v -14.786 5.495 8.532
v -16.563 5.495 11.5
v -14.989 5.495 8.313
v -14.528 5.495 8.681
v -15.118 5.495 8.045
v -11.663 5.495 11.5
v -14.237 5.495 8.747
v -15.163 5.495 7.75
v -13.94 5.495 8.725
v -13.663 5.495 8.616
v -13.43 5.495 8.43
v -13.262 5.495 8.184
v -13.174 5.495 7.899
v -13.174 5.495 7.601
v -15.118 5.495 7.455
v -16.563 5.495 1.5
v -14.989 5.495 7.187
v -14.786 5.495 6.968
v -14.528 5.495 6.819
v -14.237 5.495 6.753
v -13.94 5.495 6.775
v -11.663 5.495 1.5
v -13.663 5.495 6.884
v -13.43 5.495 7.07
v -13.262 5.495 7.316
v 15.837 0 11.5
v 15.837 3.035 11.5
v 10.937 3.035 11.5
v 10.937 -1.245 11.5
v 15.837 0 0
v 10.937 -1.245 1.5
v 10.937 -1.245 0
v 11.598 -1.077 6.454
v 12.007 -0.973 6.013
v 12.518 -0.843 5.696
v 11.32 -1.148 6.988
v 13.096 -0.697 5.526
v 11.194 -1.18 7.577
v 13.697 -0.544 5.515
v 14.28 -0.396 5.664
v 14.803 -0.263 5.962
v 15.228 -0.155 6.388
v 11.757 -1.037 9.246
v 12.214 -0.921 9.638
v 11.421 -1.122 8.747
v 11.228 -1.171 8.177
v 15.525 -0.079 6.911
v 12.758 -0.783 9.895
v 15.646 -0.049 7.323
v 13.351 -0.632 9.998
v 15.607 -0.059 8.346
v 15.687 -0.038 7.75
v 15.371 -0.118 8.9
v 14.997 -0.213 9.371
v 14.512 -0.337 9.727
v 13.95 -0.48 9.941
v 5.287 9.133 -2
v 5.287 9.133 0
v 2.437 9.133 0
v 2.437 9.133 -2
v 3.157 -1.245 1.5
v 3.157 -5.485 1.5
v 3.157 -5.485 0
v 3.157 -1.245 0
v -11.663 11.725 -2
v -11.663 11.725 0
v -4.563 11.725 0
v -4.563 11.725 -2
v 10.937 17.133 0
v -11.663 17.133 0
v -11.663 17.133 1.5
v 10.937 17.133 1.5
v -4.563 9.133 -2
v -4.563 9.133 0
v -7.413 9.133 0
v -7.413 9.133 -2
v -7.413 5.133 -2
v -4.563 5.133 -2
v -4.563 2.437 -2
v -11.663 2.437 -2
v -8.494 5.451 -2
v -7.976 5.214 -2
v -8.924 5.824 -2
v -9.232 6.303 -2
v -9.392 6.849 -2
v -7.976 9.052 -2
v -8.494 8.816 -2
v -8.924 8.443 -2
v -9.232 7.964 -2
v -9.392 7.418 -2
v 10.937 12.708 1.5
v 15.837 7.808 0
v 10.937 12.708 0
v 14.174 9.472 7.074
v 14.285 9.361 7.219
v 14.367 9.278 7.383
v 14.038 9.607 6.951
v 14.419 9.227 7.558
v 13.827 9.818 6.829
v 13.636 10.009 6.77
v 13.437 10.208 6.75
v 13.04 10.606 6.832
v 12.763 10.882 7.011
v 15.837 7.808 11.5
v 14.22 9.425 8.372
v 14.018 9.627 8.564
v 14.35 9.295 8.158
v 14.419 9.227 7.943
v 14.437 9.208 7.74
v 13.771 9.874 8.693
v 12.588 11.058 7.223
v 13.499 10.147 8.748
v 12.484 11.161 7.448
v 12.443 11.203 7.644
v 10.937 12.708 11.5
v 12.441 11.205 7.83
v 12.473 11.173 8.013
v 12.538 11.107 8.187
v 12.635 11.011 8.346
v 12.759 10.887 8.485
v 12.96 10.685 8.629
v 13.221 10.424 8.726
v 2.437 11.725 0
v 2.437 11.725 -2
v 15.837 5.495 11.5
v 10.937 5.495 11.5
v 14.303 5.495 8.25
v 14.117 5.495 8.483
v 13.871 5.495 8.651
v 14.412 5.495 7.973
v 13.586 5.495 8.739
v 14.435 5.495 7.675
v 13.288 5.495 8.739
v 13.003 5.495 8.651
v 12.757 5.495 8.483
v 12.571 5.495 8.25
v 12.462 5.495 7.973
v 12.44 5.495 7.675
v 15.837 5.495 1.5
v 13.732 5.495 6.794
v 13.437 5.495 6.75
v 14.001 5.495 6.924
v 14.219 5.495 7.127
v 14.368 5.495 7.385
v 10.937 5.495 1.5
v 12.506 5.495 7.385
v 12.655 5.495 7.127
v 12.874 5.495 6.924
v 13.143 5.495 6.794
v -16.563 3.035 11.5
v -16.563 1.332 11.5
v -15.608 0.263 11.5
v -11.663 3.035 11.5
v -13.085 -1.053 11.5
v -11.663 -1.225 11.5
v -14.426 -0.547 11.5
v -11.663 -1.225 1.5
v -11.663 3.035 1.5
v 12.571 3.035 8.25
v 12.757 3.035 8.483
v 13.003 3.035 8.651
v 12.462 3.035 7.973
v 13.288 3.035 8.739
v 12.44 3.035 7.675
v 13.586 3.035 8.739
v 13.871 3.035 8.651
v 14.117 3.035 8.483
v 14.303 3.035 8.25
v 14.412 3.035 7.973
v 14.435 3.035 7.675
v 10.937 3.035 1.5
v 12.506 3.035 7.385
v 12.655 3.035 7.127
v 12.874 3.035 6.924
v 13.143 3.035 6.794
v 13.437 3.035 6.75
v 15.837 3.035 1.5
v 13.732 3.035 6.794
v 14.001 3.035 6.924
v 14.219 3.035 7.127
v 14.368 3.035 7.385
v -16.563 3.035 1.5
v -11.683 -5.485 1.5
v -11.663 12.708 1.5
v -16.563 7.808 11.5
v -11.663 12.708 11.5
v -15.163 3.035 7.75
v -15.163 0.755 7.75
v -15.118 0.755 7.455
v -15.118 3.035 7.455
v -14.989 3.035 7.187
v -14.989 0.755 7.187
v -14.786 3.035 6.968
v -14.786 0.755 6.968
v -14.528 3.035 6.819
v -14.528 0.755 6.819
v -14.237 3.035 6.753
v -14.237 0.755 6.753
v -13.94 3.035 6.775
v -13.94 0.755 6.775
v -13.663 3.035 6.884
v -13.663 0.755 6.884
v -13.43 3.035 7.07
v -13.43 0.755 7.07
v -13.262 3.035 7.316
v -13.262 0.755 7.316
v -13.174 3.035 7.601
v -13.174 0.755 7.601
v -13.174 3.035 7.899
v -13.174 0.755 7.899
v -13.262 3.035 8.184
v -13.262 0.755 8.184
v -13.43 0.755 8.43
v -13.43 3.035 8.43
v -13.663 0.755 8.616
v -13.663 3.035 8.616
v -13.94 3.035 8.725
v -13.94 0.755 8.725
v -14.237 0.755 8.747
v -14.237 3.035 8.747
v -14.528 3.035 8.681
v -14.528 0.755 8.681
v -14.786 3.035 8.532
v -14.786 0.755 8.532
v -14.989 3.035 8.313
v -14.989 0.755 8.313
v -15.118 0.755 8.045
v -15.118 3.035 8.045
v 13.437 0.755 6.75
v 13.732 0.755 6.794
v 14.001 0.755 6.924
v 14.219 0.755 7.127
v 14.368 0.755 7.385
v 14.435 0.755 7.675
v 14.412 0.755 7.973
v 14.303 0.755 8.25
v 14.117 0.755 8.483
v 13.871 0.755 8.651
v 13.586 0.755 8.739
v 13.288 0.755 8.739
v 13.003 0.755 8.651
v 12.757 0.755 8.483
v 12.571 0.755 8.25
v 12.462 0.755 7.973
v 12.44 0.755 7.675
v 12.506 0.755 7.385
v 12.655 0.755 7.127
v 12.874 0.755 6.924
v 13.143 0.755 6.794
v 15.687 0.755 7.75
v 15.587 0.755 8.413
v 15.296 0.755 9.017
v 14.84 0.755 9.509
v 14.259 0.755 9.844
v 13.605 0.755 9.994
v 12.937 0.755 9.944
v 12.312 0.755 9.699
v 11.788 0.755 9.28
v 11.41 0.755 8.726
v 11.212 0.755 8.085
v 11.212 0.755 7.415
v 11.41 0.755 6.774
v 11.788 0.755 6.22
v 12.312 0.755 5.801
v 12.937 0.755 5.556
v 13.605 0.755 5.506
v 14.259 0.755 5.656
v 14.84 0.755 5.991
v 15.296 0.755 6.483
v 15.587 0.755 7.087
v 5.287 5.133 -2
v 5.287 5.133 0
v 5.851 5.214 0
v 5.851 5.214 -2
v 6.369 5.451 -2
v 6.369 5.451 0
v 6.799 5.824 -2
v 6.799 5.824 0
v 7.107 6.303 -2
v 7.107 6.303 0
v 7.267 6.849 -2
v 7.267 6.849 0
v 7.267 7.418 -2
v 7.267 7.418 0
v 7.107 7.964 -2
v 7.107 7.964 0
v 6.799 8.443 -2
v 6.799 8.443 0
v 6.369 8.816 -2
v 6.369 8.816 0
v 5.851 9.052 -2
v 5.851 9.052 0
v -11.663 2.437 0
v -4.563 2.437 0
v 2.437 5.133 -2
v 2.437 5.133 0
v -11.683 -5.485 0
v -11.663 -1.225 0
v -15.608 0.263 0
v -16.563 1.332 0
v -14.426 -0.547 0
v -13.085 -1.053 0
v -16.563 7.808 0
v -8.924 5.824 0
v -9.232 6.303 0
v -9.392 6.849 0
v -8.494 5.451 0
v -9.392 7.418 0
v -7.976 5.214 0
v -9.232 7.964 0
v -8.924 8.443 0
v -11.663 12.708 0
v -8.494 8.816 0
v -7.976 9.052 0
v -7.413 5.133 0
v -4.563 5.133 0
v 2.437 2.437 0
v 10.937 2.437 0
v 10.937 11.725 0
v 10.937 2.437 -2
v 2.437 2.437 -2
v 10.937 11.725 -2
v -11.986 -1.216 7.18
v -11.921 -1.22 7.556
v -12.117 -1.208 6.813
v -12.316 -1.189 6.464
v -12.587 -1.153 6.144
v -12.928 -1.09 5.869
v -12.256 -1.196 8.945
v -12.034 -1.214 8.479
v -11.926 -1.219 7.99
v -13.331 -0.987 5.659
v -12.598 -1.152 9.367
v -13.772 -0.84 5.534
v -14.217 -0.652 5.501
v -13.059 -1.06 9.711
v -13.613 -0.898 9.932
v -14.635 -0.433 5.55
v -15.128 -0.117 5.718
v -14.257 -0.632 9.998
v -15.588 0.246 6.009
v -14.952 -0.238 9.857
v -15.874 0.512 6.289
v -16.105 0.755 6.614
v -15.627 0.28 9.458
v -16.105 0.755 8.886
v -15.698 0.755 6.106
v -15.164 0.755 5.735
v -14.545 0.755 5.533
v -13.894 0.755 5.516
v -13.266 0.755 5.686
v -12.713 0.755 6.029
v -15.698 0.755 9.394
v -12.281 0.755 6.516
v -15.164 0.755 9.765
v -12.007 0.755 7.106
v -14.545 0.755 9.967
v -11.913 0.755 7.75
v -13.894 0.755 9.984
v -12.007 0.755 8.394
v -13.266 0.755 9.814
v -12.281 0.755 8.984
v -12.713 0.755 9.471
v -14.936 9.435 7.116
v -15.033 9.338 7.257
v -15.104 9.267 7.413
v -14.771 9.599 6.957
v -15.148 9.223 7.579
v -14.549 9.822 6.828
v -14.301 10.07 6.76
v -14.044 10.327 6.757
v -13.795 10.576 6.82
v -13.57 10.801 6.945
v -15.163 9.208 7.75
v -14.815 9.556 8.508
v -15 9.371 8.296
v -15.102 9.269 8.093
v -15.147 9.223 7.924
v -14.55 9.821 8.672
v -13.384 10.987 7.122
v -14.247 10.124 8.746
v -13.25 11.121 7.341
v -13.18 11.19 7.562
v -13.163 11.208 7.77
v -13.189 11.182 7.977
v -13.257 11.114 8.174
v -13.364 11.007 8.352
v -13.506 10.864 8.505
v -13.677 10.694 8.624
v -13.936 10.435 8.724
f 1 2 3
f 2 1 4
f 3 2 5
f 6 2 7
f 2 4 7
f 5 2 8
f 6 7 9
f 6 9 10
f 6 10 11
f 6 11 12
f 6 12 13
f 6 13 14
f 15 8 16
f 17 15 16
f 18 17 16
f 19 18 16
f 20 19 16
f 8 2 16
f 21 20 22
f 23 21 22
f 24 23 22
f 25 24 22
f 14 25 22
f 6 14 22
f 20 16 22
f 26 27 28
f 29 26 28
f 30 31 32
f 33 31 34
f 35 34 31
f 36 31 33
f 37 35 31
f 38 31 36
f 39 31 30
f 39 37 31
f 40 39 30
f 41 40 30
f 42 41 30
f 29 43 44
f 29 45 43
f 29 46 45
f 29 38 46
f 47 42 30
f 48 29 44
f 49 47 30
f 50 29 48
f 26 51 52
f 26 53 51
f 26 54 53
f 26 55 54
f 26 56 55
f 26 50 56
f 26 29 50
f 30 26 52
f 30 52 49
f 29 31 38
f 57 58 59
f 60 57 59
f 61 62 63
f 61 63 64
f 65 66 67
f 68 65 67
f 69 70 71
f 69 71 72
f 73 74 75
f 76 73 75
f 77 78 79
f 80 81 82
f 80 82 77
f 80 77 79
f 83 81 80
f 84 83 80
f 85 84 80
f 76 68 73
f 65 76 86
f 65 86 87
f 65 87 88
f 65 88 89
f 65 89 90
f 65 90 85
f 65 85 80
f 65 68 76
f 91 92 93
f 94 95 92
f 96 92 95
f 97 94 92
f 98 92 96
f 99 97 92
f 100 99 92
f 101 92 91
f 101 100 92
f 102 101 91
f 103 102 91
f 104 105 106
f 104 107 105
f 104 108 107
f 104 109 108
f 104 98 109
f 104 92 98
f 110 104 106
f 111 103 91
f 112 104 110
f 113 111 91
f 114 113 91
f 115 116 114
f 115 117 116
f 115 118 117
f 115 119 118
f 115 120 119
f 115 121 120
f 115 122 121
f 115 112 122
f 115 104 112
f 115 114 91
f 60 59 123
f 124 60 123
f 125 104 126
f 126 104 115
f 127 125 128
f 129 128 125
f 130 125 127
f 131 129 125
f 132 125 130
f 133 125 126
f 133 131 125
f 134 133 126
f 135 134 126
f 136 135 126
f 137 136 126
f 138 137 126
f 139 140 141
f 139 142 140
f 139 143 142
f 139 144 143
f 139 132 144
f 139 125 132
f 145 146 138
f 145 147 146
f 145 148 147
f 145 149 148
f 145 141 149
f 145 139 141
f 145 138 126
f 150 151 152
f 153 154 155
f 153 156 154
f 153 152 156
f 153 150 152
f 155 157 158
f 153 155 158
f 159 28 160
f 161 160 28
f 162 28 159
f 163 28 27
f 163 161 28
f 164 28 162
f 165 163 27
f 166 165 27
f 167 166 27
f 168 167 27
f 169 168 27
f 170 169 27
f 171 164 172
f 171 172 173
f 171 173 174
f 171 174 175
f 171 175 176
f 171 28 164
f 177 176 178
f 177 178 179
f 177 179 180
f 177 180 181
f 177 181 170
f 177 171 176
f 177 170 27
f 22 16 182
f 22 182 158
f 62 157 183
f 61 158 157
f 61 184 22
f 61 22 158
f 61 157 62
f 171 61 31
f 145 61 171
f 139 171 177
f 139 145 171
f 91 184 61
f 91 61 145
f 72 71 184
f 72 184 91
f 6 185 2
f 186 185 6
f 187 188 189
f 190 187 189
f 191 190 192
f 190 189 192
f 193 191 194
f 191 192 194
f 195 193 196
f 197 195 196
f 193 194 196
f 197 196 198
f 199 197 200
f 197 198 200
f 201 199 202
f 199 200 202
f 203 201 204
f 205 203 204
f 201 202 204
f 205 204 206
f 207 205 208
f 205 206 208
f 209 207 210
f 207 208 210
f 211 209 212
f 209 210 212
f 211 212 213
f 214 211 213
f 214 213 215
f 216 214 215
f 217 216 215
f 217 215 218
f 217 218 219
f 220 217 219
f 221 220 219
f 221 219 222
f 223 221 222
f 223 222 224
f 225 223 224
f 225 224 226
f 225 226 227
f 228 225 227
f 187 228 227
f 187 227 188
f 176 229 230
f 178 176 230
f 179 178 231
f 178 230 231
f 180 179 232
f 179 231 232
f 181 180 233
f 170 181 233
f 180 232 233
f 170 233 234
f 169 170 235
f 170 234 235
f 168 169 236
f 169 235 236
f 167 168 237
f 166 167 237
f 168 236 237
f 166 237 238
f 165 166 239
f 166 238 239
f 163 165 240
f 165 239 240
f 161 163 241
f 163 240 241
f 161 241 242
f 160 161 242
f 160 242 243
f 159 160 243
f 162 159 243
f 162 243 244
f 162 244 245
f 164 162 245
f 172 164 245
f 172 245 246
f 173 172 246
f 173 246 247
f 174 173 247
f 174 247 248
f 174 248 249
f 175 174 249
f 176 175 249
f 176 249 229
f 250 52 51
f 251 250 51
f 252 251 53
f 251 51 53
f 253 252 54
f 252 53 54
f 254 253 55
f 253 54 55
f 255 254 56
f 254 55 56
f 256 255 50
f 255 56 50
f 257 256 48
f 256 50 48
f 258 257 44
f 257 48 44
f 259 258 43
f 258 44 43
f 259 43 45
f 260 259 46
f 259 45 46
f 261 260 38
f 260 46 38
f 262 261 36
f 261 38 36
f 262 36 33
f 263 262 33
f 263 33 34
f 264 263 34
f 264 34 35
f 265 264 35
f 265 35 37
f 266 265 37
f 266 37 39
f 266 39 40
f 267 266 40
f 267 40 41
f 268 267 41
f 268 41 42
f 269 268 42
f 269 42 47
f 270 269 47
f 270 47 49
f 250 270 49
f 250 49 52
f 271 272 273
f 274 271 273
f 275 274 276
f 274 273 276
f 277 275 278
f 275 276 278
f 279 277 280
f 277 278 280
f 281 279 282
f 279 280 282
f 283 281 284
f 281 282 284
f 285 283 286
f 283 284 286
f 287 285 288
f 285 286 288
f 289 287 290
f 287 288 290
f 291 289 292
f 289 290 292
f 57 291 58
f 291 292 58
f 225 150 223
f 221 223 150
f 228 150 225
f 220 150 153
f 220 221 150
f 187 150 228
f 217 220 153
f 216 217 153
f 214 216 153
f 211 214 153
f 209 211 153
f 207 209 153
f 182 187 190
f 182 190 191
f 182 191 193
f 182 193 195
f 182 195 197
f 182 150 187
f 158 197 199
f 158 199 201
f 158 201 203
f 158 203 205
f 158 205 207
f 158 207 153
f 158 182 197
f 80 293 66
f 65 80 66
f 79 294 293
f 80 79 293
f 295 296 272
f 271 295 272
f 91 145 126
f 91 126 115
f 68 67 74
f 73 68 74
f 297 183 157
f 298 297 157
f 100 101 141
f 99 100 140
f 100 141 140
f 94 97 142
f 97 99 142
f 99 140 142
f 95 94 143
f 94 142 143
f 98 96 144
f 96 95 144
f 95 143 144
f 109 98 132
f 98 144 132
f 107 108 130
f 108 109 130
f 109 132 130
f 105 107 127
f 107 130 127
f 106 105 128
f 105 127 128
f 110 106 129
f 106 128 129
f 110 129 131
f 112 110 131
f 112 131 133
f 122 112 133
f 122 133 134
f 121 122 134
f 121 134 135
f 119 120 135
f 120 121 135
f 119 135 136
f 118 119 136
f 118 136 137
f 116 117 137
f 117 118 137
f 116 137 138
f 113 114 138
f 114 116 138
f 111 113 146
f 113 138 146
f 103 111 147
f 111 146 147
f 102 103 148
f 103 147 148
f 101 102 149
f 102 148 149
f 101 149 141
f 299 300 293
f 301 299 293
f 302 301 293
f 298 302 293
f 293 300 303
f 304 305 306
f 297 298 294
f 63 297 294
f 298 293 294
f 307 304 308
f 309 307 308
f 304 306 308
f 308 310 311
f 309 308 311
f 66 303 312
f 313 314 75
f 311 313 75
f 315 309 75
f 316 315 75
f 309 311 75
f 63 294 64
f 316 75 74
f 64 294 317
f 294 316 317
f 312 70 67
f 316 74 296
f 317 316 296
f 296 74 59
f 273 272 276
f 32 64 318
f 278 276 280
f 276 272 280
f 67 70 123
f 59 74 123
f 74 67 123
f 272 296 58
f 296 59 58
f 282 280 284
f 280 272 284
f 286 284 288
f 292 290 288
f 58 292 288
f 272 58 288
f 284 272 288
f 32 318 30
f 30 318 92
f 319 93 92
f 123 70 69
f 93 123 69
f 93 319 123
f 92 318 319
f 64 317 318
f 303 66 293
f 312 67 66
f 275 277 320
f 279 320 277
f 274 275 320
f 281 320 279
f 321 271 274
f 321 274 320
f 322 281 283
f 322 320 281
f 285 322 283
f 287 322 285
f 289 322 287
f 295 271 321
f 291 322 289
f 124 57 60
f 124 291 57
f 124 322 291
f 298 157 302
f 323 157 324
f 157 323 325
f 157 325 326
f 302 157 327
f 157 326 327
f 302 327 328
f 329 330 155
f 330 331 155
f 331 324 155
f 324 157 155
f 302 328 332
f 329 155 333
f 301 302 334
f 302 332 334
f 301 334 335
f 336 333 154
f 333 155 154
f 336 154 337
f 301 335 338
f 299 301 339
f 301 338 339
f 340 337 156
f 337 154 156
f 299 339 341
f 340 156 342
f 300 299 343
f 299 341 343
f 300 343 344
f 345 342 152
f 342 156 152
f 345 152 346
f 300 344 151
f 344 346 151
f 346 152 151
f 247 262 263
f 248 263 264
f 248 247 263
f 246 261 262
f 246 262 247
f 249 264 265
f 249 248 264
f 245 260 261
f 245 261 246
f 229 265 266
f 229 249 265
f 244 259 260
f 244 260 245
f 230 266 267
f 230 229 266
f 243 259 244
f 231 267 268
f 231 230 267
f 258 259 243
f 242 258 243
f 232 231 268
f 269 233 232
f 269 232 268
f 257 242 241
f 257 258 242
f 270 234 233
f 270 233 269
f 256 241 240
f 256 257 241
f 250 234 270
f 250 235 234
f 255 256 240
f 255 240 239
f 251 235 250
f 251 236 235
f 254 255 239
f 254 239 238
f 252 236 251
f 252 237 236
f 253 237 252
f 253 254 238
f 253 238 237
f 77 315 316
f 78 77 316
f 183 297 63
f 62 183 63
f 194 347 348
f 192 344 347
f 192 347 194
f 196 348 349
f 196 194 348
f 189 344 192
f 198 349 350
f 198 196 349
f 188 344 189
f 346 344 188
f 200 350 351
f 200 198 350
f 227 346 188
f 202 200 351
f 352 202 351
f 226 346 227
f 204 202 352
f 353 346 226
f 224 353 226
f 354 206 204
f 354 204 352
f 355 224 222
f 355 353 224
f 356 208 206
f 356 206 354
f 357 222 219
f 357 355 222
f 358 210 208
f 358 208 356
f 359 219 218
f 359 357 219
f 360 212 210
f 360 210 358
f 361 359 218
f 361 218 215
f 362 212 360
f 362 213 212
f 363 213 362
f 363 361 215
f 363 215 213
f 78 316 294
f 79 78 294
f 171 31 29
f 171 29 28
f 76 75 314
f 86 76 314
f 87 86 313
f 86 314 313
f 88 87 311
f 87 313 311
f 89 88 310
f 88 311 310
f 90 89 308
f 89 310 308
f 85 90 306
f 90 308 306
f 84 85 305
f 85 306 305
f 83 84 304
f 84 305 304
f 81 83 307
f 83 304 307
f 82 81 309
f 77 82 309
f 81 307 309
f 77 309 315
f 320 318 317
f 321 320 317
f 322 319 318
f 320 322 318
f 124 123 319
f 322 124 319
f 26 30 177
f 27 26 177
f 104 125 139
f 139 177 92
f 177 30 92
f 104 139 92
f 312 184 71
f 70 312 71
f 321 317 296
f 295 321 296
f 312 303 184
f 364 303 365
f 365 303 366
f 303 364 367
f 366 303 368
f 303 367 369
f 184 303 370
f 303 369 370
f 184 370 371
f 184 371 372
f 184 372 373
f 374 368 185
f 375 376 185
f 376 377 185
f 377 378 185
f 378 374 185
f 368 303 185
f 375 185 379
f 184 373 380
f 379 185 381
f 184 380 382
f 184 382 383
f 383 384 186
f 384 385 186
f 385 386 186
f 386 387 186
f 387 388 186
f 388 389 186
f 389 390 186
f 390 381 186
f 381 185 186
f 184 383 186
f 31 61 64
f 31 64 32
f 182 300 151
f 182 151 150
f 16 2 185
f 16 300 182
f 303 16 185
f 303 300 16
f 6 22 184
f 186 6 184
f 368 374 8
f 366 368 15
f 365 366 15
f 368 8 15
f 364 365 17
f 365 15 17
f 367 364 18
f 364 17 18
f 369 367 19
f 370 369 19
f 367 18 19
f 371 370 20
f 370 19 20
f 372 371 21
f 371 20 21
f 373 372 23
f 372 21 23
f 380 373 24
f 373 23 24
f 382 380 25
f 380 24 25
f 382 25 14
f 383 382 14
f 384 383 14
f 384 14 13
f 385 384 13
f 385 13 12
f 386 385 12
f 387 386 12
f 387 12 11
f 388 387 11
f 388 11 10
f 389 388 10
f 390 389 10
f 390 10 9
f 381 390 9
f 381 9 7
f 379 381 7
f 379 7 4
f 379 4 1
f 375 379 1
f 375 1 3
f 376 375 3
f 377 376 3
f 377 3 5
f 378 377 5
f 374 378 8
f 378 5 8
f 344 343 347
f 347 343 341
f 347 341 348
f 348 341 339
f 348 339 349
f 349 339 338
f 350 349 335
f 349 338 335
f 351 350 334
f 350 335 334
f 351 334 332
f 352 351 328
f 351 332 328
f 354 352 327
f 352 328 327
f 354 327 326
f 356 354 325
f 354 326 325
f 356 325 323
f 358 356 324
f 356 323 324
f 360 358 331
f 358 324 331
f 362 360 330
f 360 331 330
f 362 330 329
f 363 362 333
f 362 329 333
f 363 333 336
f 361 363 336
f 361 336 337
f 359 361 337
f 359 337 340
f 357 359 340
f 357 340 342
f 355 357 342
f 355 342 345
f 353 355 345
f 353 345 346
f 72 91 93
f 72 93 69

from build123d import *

# Parameters (mm, degrees)
SKETCH_1_W          = 32.4
SKETCH_1_H          = 30
EXTRUDE_1_DEPTH     = 1.5
SKETCH_2_W          = 4.9
SKETCH_2_H          = 8.52
EXTRUDE_2_DEPTH     = 10
CUT_EXTRUDE_1_DEPTH = 11.5
SKETCH_4_R          = 1
CUT_EXTRUDE_2_DEPTH = 31.5
CUT_EXTRUDE_3_DEPTH = 10
EXTRUDE_3_DEPTH     = 2
CUT_EXTRUDE_4_DEPTH = 6
SKETCH_8_R          = 2.25
CUT_EXTRUDE_5_DEPTH = 2


with BuildPart() as part:
    # 草图1 → 凸台-拉伸1 (new body)
    with BuildSketch(Plane.XY):
        with Locations((-0.362675268, 2.133428793)):
            Rectangle(SKETCH_1_W, SKETCH_1_H)
    extrude(amount=EXTRUDE_1_DEPTH)

    # 草图2 → 凸台-拉伸2 (add)
    with BuildSketch(Plane.XY.offset(1.5)):
        with Locations((-14.112675268, -1.225199495)):
            Rectangle(SKETCH_2_W, SKETCH_2_H)
        Polygon((-16.562675268, 5.494800505), (-11.662675268, 5.494800505), (-11.662675268, 12.70812694), (-16.562675268, 7.80812694), align=None)
        Polygon((10.937324732, 5.494800505), (10.937324732, 12.70812694), (15.837324732, 7.80812694), (15.837324732, 5.494800505), align=None)
        Polygon((10.937324732, 3.034800505), (15.837324732, 3.034800505), (15.837324732, 0), (10.937324732, -1.245199495), align=None)
    extrude(amount=EXTRUDE_2_DEPTH)

    # 草图3 → 切除-拉伸1 (cut)
    with BuildSketch(Plane.XY.offset(1.5)):
        Polygon((-16.562675268, 7.80812694), (-11.662675268, 12.70812694), (-11.662675268, 17.133428793), (-16.562675268, 17.133428793), align=None)
        Polygon((15.837324732, 7.80812694), (10.937324732, 12.70812694), (10.937324732, 17.133428793), (15.837324732, 17.133428793), align=None)
        Polygon((-16.562675268, -12.866571207), (-16.562675268, -8.702000753), (-16.562675268, -5.485199495), (3.157324732, -5.485199495), (3.157324732, -1.245199495), (10.937324732, -1.245199495), (15.837324732, 0), (15.837324732, -12.866571207), align=None)
    extrude(amount=-CUT_EXTRUDE_1_DEPTH, mode=Mode.SUBTRACT)

    # 草图4 → 切除-拉伸2 (cut)
    with BuildSketch(Plane.XZ.offset(5.485199495)):
        with Locations(Location((-14.162675268, 7.75, 0), (0, 0, 180))):
            Circle(SKETCH_4_R)
        with Locations(Location((13.437324732, 7.75, 0), (0, 0, 270))):
            Circle(SKETCH_4_R)
    extrude(amount=-CUT_EXTRUDE_2_DEPTH, mode=Mode.SUBTRACT)

    # 草图5 → 切除-拉伸3 (cut)
    with BuildSketch(Plane.XY.offset(11.5)):
        with BuildLine():
            Line((-11.662675268, -5.485199495), (-11.662675268, -1.225199495))
            ThreePointArc((-11.662675268, -1.225199495), (-14.426273503, -0.547412969), (-16.562675268, 1.332123483))
            Line((-16.562675268, 1.332123483), (-16.562675268, -5.485199495))
            Line((-16.562675268, -5.485199495), (-11.662675268, -5.485199495))
        make_face()
    extrude(amount=-CUT_EXTRUDE_3_DEPTH, mode=Mode.SUBTRACT)

    # 草图6 → 凸台-拉伸3 (add)
    with BuildSketch(Plane(origin=(0, 0, 0), x_dir=(-1, 0, 0), z_dir=(0, 0, -1))):
        with BuildLine():
            Line((4.562675268, 9.133428793), (7.412675268, 9.133428793))
            ThreePointArc((7.412675268, 9.133428793), (9.412675268, 7.133428793), (7.412675268, 5.133428793))
            Line((7.412675268, 5.133428793), (4.562675268, 5.133428793))
            Line((4.562675268, 5.133428793), (4.562675268, 2.436720349))
            Line((4.562675268, 2.436720349), (11.662675268, 2.436720349))
            Line((11.662675268, 2.436720349), (11.662675268, 11.725210418))
            Line((11.662675268, 11.725210418), (4.562675268, 11.725210418))
            Line((4.562675268, 11.725210418), (4.562675268, 9.133428793))
        make_face()
        with BuildLine():
            Line((-5.287324731, 9.133428793), (-2.437324732, 9.133428793))
            Line((-2.437324732, 9.133428793), (-2.437324732, 11.725210418))
            Line((-2.437324732, 11.725210418), (-10.937324732, 11.725210418))
            Line((-10.937324732, 11.725210418), (-10.937324732, 2.436720349))
            Line((-10.937324732, 2.436720349), (-2.437324732, 2.436720349))
            Line((-2.437324732, 2.436720349), (-2.437324732, 5.133428793))
            Line((-2.437324732, 5.133428793), (-5.287324731, 5.133428793))
            ThreePointArc((-5.287324731, 5.133428793), (-7.287324731, 7.133428793), (-5.287324731, 9.133428793))
        make_face()
    extrude(amount=EXTRUDE_3_DEPTH)

    # 草图7 → 切除-拉伸4 (cut)
    with BuildSketch(Plane.XY.offset(1.5)):
        with BuildLine():
            Line((-16.562675268, 1.332123483), (-16.562675268, -5.485199495))
            Line((-16.562675268, -5.485199495), (-11.683364196, -5.485199495))
            Line((-11.683364196, -5.485199495), (-11.662675268, -1.225199495))
            ThreePointArc((-11.662675268, -1.225199495), (-14.426273503, -0.547412969), (-16.562675268, 1.332123483))
        make_face()
    extrude(amount=-CUT_EXTRUDE_4_DEPTH, mode=Mode.SUBTRACT)

    # 草图8 → 切除-拉伸5 (cut)
    with BuildSketch(Plane.XZ.offset(1.245199495)):
        with Locations((13.437324732, 7.75)):
            Circle(SKETCH_8_R)
        with Locations((-14.162675268, 7.75)):
            Circle(SKETCH_8_R)
    extrude(amount=-CUT_EXTRUDE_5_DEPTH, mode=Mode.SUBTRACT)


solid = part.part
